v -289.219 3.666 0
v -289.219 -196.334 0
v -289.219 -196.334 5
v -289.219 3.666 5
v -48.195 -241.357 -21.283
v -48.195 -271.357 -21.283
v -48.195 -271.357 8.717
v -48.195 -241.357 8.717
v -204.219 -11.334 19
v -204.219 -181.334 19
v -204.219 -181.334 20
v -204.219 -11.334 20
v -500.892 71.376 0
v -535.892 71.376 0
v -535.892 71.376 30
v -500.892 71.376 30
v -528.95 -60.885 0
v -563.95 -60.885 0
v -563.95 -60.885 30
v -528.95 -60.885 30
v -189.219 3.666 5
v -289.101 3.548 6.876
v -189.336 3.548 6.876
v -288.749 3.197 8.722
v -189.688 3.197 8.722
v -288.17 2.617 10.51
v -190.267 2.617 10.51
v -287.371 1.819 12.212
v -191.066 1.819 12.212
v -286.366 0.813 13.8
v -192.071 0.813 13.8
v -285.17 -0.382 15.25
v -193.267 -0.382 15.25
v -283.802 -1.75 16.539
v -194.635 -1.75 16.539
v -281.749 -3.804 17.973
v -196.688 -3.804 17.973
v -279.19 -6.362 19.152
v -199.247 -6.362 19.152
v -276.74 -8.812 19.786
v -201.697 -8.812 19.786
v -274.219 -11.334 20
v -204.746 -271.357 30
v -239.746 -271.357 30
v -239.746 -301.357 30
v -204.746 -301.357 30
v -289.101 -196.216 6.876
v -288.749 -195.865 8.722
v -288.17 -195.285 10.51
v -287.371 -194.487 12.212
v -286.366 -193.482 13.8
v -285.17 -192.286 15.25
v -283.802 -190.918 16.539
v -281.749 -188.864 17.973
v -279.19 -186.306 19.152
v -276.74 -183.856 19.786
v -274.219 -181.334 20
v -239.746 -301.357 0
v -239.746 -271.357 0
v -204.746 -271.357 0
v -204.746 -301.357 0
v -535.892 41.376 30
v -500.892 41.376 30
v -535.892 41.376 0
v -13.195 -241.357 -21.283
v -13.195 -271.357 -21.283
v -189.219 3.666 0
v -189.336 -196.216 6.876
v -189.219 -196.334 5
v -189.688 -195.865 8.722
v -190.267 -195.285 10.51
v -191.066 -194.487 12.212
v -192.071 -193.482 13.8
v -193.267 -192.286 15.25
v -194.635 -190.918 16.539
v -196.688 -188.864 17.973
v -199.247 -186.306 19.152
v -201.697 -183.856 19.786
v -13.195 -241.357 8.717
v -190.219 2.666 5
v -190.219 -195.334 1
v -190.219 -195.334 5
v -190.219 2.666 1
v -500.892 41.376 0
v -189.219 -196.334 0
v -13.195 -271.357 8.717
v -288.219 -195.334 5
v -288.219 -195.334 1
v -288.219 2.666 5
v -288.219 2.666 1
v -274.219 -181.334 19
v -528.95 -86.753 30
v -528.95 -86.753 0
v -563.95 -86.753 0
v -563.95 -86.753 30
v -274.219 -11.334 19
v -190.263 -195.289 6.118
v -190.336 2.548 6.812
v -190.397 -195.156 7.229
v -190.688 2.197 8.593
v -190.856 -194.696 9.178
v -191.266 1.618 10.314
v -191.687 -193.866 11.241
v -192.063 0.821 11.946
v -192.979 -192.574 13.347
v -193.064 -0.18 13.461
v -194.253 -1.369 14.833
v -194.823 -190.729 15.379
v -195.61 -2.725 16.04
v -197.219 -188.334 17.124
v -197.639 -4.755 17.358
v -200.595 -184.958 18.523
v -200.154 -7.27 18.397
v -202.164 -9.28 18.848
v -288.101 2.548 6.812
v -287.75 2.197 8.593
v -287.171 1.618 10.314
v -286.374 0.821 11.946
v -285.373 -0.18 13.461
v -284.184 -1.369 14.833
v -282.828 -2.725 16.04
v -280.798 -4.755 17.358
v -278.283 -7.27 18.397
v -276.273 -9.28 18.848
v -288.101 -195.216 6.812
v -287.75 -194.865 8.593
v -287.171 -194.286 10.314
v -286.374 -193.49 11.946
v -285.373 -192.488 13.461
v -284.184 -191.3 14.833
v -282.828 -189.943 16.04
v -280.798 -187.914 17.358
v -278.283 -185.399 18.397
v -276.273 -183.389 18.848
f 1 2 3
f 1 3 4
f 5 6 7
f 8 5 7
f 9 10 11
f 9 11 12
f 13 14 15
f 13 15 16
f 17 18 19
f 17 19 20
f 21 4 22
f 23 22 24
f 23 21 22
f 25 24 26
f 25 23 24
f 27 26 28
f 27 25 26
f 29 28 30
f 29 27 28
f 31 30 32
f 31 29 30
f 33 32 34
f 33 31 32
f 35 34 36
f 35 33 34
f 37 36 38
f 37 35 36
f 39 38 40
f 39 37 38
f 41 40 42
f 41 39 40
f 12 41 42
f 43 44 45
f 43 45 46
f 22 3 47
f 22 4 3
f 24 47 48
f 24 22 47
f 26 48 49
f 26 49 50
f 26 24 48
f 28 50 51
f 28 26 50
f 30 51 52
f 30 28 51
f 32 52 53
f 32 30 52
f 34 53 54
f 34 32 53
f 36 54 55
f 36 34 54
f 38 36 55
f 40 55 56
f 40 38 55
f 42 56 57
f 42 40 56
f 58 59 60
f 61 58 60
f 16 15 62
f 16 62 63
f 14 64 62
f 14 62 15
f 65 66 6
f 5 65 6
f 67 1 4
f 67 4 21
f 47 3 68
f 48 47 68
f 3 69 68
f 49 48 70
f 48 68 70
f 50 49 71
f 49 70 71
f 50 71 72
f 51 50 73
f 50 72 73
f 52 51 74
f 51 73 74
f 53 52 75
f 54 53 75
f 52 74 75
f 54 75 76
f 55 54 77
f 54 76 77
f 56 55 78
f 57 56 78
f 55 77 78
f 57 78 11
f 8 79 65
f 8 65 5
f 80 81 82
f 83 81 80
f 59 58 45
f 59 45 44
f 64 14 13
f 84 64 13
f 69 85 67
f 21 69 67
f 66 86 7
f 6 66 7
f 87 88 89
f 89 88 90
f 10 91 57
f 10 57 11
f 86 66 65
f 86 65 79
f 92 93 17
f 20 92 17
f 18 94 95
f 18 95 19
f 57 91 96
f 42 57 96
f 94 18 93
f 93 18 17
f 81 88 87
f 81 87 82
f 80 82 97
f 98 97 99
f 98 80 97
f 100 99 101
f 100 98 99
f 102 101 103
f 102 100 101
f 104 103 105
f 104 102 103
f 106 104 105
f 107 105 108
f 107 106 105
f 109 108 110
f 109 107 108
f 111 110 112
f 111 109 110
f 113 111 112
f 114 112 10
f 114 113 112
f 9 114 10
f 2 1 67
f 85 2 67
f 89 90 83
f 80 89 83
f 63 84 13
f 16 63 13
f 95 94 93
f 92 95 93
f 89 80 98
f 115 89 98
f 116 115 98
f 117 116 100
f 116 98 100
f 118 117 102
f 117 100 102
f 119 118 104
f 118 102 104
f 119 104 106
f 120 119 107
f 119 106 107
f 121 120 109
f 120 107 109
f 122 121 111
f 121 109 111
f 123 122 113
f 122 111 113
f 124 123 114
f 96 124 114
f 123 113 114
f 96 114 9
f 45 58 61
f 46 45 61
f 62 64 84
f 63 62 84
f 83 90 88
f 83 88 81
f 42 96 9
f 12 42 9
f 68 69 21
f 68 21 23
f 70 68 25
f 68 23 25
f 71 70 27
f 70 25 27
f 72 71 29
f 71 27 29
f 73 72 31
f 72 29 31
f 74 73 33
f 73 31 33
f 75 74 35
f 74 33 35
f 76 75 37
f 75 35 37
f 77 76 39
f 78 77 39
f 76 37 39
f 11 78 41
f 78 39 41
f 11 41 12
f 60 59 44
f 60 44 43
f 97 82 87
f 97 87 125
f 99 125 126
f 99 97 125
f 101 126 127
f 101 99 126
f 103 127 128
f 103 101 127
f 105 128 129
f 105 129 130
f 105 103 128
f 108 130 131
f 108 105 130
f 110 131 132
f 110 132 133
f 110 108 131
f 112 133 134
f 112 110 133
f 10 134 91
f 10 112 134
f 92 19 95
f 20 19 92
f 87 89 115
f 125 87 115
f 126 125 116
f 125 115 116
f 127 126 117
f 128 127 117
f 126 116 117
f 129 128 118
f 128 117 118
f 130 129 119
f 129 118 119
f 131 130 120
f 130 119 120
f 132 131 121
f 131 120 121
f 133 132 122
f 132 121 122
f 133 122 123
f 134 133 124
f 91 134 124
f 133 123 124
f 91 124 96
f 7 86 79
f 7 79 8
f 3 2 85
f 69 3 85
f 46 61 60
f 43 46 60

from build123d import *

# Parameters (mm, degrees)
F0_W      = 100
F0_H      = 200
F1_DEPTH  = 20
F2_R      = 15
F3_T      = -1
F4_W      = 35
F4_H      = 30
F5_DEPTH  = 30
F6_W      = 35
F6_H      = 30
F7_DEPTH  = 30
F8_W      = 35
F8_H      = 25.8680122671
F9_DEPTH  = 30
F10_W     = 35
F10_H     = 30
F11_DEPTH = 30


# Not quite as in the source:
# - a shell that OpenCascade refuses in one call is made with other operations: the cavity is built on its own and cut out


with BuildPart() as f1:
    # F0 (on Top) → F1 (new body)
    with BuildSketch(Plane.XY):
        with Locations((-239.2185236739, -96.3341407478)):
            Rectangle(F0_W, F0_H)
    extrude(amount=F1_DEPTH)

    # F2
    f2_edges = [f1.edges().sort_by_distance(p)[0] for p in [
        (-189.218524, -96.334141, 20),
        (-239.218524, -196.334141, 20),
        (-239.218524, 3.665859, 20),
        (-289.218524, -96.334141, 20),
    ]]
    fillet(f2_edges, radius=F2_R)

    # F3: a shell. OpenCascade refuses it in one call, so the cavity is built on its own and cut out:
    # the body offset inwards by the wall thickness, plus a prism from it out through each open face.
    f3_core = offset(f1.part, amount=F3_T, mode=Mode.PRIVATE)
    f3_exits = [f3_core.faces().sort_by_distance(p)[0] for p in [
        (-239.218524, -96.334141, 19),
    ]]
    add(f3_core, mode=Mode.SUBTRACT)
    extrude(f3_exits, amount=-F3_T, mode=Mode.SUBTRACT)


with BuildPart() as f5:
    # F4 (on Top) → F5 (new body)
    with BuildSketch(Plane.XY):
        with Locations((-222.2460955381, -286.3571236897)):
            Rectangle(F4_W, F4_H)
    extrude(amount=F5_DEPTH)


with BuildPart() as f7:
    # F6 (on face) → F7 (new body)
    with BuildSketch(Plane(origin=(0, -271.3571236897, 0), x_dir=(-1, 0, 0), z_dir=(0, 1, 0))):
        with Locations((30.6952949613, -6.2826325541)):
            Rectangle(F6_W, F6_H)
    extrude(amount=F7_DEPTH)


with BuildPart() as f9:
    # F8 (on Top) → F9 (new body)
    with BuildSketch(Plane.XY):
        with Locations((-546.4502573013, -73.8191474229)):
            Rectangle(F8_W, F8_H)
    extrude(amount=F9_DEPTH)


with BuildPart() as f11:
    # F10 (on Top) → F11 (new body)
    with BuildSketch(Plane.XY):
        with Locations((-518.3916091919, 56.3756684118)):
            Rectangle(F10_W, F10_H)
    extrude(amount=F11_DEPTH)


solid = Compound([f1.part, f5.part, f7.part, f9.part, f11.part])
